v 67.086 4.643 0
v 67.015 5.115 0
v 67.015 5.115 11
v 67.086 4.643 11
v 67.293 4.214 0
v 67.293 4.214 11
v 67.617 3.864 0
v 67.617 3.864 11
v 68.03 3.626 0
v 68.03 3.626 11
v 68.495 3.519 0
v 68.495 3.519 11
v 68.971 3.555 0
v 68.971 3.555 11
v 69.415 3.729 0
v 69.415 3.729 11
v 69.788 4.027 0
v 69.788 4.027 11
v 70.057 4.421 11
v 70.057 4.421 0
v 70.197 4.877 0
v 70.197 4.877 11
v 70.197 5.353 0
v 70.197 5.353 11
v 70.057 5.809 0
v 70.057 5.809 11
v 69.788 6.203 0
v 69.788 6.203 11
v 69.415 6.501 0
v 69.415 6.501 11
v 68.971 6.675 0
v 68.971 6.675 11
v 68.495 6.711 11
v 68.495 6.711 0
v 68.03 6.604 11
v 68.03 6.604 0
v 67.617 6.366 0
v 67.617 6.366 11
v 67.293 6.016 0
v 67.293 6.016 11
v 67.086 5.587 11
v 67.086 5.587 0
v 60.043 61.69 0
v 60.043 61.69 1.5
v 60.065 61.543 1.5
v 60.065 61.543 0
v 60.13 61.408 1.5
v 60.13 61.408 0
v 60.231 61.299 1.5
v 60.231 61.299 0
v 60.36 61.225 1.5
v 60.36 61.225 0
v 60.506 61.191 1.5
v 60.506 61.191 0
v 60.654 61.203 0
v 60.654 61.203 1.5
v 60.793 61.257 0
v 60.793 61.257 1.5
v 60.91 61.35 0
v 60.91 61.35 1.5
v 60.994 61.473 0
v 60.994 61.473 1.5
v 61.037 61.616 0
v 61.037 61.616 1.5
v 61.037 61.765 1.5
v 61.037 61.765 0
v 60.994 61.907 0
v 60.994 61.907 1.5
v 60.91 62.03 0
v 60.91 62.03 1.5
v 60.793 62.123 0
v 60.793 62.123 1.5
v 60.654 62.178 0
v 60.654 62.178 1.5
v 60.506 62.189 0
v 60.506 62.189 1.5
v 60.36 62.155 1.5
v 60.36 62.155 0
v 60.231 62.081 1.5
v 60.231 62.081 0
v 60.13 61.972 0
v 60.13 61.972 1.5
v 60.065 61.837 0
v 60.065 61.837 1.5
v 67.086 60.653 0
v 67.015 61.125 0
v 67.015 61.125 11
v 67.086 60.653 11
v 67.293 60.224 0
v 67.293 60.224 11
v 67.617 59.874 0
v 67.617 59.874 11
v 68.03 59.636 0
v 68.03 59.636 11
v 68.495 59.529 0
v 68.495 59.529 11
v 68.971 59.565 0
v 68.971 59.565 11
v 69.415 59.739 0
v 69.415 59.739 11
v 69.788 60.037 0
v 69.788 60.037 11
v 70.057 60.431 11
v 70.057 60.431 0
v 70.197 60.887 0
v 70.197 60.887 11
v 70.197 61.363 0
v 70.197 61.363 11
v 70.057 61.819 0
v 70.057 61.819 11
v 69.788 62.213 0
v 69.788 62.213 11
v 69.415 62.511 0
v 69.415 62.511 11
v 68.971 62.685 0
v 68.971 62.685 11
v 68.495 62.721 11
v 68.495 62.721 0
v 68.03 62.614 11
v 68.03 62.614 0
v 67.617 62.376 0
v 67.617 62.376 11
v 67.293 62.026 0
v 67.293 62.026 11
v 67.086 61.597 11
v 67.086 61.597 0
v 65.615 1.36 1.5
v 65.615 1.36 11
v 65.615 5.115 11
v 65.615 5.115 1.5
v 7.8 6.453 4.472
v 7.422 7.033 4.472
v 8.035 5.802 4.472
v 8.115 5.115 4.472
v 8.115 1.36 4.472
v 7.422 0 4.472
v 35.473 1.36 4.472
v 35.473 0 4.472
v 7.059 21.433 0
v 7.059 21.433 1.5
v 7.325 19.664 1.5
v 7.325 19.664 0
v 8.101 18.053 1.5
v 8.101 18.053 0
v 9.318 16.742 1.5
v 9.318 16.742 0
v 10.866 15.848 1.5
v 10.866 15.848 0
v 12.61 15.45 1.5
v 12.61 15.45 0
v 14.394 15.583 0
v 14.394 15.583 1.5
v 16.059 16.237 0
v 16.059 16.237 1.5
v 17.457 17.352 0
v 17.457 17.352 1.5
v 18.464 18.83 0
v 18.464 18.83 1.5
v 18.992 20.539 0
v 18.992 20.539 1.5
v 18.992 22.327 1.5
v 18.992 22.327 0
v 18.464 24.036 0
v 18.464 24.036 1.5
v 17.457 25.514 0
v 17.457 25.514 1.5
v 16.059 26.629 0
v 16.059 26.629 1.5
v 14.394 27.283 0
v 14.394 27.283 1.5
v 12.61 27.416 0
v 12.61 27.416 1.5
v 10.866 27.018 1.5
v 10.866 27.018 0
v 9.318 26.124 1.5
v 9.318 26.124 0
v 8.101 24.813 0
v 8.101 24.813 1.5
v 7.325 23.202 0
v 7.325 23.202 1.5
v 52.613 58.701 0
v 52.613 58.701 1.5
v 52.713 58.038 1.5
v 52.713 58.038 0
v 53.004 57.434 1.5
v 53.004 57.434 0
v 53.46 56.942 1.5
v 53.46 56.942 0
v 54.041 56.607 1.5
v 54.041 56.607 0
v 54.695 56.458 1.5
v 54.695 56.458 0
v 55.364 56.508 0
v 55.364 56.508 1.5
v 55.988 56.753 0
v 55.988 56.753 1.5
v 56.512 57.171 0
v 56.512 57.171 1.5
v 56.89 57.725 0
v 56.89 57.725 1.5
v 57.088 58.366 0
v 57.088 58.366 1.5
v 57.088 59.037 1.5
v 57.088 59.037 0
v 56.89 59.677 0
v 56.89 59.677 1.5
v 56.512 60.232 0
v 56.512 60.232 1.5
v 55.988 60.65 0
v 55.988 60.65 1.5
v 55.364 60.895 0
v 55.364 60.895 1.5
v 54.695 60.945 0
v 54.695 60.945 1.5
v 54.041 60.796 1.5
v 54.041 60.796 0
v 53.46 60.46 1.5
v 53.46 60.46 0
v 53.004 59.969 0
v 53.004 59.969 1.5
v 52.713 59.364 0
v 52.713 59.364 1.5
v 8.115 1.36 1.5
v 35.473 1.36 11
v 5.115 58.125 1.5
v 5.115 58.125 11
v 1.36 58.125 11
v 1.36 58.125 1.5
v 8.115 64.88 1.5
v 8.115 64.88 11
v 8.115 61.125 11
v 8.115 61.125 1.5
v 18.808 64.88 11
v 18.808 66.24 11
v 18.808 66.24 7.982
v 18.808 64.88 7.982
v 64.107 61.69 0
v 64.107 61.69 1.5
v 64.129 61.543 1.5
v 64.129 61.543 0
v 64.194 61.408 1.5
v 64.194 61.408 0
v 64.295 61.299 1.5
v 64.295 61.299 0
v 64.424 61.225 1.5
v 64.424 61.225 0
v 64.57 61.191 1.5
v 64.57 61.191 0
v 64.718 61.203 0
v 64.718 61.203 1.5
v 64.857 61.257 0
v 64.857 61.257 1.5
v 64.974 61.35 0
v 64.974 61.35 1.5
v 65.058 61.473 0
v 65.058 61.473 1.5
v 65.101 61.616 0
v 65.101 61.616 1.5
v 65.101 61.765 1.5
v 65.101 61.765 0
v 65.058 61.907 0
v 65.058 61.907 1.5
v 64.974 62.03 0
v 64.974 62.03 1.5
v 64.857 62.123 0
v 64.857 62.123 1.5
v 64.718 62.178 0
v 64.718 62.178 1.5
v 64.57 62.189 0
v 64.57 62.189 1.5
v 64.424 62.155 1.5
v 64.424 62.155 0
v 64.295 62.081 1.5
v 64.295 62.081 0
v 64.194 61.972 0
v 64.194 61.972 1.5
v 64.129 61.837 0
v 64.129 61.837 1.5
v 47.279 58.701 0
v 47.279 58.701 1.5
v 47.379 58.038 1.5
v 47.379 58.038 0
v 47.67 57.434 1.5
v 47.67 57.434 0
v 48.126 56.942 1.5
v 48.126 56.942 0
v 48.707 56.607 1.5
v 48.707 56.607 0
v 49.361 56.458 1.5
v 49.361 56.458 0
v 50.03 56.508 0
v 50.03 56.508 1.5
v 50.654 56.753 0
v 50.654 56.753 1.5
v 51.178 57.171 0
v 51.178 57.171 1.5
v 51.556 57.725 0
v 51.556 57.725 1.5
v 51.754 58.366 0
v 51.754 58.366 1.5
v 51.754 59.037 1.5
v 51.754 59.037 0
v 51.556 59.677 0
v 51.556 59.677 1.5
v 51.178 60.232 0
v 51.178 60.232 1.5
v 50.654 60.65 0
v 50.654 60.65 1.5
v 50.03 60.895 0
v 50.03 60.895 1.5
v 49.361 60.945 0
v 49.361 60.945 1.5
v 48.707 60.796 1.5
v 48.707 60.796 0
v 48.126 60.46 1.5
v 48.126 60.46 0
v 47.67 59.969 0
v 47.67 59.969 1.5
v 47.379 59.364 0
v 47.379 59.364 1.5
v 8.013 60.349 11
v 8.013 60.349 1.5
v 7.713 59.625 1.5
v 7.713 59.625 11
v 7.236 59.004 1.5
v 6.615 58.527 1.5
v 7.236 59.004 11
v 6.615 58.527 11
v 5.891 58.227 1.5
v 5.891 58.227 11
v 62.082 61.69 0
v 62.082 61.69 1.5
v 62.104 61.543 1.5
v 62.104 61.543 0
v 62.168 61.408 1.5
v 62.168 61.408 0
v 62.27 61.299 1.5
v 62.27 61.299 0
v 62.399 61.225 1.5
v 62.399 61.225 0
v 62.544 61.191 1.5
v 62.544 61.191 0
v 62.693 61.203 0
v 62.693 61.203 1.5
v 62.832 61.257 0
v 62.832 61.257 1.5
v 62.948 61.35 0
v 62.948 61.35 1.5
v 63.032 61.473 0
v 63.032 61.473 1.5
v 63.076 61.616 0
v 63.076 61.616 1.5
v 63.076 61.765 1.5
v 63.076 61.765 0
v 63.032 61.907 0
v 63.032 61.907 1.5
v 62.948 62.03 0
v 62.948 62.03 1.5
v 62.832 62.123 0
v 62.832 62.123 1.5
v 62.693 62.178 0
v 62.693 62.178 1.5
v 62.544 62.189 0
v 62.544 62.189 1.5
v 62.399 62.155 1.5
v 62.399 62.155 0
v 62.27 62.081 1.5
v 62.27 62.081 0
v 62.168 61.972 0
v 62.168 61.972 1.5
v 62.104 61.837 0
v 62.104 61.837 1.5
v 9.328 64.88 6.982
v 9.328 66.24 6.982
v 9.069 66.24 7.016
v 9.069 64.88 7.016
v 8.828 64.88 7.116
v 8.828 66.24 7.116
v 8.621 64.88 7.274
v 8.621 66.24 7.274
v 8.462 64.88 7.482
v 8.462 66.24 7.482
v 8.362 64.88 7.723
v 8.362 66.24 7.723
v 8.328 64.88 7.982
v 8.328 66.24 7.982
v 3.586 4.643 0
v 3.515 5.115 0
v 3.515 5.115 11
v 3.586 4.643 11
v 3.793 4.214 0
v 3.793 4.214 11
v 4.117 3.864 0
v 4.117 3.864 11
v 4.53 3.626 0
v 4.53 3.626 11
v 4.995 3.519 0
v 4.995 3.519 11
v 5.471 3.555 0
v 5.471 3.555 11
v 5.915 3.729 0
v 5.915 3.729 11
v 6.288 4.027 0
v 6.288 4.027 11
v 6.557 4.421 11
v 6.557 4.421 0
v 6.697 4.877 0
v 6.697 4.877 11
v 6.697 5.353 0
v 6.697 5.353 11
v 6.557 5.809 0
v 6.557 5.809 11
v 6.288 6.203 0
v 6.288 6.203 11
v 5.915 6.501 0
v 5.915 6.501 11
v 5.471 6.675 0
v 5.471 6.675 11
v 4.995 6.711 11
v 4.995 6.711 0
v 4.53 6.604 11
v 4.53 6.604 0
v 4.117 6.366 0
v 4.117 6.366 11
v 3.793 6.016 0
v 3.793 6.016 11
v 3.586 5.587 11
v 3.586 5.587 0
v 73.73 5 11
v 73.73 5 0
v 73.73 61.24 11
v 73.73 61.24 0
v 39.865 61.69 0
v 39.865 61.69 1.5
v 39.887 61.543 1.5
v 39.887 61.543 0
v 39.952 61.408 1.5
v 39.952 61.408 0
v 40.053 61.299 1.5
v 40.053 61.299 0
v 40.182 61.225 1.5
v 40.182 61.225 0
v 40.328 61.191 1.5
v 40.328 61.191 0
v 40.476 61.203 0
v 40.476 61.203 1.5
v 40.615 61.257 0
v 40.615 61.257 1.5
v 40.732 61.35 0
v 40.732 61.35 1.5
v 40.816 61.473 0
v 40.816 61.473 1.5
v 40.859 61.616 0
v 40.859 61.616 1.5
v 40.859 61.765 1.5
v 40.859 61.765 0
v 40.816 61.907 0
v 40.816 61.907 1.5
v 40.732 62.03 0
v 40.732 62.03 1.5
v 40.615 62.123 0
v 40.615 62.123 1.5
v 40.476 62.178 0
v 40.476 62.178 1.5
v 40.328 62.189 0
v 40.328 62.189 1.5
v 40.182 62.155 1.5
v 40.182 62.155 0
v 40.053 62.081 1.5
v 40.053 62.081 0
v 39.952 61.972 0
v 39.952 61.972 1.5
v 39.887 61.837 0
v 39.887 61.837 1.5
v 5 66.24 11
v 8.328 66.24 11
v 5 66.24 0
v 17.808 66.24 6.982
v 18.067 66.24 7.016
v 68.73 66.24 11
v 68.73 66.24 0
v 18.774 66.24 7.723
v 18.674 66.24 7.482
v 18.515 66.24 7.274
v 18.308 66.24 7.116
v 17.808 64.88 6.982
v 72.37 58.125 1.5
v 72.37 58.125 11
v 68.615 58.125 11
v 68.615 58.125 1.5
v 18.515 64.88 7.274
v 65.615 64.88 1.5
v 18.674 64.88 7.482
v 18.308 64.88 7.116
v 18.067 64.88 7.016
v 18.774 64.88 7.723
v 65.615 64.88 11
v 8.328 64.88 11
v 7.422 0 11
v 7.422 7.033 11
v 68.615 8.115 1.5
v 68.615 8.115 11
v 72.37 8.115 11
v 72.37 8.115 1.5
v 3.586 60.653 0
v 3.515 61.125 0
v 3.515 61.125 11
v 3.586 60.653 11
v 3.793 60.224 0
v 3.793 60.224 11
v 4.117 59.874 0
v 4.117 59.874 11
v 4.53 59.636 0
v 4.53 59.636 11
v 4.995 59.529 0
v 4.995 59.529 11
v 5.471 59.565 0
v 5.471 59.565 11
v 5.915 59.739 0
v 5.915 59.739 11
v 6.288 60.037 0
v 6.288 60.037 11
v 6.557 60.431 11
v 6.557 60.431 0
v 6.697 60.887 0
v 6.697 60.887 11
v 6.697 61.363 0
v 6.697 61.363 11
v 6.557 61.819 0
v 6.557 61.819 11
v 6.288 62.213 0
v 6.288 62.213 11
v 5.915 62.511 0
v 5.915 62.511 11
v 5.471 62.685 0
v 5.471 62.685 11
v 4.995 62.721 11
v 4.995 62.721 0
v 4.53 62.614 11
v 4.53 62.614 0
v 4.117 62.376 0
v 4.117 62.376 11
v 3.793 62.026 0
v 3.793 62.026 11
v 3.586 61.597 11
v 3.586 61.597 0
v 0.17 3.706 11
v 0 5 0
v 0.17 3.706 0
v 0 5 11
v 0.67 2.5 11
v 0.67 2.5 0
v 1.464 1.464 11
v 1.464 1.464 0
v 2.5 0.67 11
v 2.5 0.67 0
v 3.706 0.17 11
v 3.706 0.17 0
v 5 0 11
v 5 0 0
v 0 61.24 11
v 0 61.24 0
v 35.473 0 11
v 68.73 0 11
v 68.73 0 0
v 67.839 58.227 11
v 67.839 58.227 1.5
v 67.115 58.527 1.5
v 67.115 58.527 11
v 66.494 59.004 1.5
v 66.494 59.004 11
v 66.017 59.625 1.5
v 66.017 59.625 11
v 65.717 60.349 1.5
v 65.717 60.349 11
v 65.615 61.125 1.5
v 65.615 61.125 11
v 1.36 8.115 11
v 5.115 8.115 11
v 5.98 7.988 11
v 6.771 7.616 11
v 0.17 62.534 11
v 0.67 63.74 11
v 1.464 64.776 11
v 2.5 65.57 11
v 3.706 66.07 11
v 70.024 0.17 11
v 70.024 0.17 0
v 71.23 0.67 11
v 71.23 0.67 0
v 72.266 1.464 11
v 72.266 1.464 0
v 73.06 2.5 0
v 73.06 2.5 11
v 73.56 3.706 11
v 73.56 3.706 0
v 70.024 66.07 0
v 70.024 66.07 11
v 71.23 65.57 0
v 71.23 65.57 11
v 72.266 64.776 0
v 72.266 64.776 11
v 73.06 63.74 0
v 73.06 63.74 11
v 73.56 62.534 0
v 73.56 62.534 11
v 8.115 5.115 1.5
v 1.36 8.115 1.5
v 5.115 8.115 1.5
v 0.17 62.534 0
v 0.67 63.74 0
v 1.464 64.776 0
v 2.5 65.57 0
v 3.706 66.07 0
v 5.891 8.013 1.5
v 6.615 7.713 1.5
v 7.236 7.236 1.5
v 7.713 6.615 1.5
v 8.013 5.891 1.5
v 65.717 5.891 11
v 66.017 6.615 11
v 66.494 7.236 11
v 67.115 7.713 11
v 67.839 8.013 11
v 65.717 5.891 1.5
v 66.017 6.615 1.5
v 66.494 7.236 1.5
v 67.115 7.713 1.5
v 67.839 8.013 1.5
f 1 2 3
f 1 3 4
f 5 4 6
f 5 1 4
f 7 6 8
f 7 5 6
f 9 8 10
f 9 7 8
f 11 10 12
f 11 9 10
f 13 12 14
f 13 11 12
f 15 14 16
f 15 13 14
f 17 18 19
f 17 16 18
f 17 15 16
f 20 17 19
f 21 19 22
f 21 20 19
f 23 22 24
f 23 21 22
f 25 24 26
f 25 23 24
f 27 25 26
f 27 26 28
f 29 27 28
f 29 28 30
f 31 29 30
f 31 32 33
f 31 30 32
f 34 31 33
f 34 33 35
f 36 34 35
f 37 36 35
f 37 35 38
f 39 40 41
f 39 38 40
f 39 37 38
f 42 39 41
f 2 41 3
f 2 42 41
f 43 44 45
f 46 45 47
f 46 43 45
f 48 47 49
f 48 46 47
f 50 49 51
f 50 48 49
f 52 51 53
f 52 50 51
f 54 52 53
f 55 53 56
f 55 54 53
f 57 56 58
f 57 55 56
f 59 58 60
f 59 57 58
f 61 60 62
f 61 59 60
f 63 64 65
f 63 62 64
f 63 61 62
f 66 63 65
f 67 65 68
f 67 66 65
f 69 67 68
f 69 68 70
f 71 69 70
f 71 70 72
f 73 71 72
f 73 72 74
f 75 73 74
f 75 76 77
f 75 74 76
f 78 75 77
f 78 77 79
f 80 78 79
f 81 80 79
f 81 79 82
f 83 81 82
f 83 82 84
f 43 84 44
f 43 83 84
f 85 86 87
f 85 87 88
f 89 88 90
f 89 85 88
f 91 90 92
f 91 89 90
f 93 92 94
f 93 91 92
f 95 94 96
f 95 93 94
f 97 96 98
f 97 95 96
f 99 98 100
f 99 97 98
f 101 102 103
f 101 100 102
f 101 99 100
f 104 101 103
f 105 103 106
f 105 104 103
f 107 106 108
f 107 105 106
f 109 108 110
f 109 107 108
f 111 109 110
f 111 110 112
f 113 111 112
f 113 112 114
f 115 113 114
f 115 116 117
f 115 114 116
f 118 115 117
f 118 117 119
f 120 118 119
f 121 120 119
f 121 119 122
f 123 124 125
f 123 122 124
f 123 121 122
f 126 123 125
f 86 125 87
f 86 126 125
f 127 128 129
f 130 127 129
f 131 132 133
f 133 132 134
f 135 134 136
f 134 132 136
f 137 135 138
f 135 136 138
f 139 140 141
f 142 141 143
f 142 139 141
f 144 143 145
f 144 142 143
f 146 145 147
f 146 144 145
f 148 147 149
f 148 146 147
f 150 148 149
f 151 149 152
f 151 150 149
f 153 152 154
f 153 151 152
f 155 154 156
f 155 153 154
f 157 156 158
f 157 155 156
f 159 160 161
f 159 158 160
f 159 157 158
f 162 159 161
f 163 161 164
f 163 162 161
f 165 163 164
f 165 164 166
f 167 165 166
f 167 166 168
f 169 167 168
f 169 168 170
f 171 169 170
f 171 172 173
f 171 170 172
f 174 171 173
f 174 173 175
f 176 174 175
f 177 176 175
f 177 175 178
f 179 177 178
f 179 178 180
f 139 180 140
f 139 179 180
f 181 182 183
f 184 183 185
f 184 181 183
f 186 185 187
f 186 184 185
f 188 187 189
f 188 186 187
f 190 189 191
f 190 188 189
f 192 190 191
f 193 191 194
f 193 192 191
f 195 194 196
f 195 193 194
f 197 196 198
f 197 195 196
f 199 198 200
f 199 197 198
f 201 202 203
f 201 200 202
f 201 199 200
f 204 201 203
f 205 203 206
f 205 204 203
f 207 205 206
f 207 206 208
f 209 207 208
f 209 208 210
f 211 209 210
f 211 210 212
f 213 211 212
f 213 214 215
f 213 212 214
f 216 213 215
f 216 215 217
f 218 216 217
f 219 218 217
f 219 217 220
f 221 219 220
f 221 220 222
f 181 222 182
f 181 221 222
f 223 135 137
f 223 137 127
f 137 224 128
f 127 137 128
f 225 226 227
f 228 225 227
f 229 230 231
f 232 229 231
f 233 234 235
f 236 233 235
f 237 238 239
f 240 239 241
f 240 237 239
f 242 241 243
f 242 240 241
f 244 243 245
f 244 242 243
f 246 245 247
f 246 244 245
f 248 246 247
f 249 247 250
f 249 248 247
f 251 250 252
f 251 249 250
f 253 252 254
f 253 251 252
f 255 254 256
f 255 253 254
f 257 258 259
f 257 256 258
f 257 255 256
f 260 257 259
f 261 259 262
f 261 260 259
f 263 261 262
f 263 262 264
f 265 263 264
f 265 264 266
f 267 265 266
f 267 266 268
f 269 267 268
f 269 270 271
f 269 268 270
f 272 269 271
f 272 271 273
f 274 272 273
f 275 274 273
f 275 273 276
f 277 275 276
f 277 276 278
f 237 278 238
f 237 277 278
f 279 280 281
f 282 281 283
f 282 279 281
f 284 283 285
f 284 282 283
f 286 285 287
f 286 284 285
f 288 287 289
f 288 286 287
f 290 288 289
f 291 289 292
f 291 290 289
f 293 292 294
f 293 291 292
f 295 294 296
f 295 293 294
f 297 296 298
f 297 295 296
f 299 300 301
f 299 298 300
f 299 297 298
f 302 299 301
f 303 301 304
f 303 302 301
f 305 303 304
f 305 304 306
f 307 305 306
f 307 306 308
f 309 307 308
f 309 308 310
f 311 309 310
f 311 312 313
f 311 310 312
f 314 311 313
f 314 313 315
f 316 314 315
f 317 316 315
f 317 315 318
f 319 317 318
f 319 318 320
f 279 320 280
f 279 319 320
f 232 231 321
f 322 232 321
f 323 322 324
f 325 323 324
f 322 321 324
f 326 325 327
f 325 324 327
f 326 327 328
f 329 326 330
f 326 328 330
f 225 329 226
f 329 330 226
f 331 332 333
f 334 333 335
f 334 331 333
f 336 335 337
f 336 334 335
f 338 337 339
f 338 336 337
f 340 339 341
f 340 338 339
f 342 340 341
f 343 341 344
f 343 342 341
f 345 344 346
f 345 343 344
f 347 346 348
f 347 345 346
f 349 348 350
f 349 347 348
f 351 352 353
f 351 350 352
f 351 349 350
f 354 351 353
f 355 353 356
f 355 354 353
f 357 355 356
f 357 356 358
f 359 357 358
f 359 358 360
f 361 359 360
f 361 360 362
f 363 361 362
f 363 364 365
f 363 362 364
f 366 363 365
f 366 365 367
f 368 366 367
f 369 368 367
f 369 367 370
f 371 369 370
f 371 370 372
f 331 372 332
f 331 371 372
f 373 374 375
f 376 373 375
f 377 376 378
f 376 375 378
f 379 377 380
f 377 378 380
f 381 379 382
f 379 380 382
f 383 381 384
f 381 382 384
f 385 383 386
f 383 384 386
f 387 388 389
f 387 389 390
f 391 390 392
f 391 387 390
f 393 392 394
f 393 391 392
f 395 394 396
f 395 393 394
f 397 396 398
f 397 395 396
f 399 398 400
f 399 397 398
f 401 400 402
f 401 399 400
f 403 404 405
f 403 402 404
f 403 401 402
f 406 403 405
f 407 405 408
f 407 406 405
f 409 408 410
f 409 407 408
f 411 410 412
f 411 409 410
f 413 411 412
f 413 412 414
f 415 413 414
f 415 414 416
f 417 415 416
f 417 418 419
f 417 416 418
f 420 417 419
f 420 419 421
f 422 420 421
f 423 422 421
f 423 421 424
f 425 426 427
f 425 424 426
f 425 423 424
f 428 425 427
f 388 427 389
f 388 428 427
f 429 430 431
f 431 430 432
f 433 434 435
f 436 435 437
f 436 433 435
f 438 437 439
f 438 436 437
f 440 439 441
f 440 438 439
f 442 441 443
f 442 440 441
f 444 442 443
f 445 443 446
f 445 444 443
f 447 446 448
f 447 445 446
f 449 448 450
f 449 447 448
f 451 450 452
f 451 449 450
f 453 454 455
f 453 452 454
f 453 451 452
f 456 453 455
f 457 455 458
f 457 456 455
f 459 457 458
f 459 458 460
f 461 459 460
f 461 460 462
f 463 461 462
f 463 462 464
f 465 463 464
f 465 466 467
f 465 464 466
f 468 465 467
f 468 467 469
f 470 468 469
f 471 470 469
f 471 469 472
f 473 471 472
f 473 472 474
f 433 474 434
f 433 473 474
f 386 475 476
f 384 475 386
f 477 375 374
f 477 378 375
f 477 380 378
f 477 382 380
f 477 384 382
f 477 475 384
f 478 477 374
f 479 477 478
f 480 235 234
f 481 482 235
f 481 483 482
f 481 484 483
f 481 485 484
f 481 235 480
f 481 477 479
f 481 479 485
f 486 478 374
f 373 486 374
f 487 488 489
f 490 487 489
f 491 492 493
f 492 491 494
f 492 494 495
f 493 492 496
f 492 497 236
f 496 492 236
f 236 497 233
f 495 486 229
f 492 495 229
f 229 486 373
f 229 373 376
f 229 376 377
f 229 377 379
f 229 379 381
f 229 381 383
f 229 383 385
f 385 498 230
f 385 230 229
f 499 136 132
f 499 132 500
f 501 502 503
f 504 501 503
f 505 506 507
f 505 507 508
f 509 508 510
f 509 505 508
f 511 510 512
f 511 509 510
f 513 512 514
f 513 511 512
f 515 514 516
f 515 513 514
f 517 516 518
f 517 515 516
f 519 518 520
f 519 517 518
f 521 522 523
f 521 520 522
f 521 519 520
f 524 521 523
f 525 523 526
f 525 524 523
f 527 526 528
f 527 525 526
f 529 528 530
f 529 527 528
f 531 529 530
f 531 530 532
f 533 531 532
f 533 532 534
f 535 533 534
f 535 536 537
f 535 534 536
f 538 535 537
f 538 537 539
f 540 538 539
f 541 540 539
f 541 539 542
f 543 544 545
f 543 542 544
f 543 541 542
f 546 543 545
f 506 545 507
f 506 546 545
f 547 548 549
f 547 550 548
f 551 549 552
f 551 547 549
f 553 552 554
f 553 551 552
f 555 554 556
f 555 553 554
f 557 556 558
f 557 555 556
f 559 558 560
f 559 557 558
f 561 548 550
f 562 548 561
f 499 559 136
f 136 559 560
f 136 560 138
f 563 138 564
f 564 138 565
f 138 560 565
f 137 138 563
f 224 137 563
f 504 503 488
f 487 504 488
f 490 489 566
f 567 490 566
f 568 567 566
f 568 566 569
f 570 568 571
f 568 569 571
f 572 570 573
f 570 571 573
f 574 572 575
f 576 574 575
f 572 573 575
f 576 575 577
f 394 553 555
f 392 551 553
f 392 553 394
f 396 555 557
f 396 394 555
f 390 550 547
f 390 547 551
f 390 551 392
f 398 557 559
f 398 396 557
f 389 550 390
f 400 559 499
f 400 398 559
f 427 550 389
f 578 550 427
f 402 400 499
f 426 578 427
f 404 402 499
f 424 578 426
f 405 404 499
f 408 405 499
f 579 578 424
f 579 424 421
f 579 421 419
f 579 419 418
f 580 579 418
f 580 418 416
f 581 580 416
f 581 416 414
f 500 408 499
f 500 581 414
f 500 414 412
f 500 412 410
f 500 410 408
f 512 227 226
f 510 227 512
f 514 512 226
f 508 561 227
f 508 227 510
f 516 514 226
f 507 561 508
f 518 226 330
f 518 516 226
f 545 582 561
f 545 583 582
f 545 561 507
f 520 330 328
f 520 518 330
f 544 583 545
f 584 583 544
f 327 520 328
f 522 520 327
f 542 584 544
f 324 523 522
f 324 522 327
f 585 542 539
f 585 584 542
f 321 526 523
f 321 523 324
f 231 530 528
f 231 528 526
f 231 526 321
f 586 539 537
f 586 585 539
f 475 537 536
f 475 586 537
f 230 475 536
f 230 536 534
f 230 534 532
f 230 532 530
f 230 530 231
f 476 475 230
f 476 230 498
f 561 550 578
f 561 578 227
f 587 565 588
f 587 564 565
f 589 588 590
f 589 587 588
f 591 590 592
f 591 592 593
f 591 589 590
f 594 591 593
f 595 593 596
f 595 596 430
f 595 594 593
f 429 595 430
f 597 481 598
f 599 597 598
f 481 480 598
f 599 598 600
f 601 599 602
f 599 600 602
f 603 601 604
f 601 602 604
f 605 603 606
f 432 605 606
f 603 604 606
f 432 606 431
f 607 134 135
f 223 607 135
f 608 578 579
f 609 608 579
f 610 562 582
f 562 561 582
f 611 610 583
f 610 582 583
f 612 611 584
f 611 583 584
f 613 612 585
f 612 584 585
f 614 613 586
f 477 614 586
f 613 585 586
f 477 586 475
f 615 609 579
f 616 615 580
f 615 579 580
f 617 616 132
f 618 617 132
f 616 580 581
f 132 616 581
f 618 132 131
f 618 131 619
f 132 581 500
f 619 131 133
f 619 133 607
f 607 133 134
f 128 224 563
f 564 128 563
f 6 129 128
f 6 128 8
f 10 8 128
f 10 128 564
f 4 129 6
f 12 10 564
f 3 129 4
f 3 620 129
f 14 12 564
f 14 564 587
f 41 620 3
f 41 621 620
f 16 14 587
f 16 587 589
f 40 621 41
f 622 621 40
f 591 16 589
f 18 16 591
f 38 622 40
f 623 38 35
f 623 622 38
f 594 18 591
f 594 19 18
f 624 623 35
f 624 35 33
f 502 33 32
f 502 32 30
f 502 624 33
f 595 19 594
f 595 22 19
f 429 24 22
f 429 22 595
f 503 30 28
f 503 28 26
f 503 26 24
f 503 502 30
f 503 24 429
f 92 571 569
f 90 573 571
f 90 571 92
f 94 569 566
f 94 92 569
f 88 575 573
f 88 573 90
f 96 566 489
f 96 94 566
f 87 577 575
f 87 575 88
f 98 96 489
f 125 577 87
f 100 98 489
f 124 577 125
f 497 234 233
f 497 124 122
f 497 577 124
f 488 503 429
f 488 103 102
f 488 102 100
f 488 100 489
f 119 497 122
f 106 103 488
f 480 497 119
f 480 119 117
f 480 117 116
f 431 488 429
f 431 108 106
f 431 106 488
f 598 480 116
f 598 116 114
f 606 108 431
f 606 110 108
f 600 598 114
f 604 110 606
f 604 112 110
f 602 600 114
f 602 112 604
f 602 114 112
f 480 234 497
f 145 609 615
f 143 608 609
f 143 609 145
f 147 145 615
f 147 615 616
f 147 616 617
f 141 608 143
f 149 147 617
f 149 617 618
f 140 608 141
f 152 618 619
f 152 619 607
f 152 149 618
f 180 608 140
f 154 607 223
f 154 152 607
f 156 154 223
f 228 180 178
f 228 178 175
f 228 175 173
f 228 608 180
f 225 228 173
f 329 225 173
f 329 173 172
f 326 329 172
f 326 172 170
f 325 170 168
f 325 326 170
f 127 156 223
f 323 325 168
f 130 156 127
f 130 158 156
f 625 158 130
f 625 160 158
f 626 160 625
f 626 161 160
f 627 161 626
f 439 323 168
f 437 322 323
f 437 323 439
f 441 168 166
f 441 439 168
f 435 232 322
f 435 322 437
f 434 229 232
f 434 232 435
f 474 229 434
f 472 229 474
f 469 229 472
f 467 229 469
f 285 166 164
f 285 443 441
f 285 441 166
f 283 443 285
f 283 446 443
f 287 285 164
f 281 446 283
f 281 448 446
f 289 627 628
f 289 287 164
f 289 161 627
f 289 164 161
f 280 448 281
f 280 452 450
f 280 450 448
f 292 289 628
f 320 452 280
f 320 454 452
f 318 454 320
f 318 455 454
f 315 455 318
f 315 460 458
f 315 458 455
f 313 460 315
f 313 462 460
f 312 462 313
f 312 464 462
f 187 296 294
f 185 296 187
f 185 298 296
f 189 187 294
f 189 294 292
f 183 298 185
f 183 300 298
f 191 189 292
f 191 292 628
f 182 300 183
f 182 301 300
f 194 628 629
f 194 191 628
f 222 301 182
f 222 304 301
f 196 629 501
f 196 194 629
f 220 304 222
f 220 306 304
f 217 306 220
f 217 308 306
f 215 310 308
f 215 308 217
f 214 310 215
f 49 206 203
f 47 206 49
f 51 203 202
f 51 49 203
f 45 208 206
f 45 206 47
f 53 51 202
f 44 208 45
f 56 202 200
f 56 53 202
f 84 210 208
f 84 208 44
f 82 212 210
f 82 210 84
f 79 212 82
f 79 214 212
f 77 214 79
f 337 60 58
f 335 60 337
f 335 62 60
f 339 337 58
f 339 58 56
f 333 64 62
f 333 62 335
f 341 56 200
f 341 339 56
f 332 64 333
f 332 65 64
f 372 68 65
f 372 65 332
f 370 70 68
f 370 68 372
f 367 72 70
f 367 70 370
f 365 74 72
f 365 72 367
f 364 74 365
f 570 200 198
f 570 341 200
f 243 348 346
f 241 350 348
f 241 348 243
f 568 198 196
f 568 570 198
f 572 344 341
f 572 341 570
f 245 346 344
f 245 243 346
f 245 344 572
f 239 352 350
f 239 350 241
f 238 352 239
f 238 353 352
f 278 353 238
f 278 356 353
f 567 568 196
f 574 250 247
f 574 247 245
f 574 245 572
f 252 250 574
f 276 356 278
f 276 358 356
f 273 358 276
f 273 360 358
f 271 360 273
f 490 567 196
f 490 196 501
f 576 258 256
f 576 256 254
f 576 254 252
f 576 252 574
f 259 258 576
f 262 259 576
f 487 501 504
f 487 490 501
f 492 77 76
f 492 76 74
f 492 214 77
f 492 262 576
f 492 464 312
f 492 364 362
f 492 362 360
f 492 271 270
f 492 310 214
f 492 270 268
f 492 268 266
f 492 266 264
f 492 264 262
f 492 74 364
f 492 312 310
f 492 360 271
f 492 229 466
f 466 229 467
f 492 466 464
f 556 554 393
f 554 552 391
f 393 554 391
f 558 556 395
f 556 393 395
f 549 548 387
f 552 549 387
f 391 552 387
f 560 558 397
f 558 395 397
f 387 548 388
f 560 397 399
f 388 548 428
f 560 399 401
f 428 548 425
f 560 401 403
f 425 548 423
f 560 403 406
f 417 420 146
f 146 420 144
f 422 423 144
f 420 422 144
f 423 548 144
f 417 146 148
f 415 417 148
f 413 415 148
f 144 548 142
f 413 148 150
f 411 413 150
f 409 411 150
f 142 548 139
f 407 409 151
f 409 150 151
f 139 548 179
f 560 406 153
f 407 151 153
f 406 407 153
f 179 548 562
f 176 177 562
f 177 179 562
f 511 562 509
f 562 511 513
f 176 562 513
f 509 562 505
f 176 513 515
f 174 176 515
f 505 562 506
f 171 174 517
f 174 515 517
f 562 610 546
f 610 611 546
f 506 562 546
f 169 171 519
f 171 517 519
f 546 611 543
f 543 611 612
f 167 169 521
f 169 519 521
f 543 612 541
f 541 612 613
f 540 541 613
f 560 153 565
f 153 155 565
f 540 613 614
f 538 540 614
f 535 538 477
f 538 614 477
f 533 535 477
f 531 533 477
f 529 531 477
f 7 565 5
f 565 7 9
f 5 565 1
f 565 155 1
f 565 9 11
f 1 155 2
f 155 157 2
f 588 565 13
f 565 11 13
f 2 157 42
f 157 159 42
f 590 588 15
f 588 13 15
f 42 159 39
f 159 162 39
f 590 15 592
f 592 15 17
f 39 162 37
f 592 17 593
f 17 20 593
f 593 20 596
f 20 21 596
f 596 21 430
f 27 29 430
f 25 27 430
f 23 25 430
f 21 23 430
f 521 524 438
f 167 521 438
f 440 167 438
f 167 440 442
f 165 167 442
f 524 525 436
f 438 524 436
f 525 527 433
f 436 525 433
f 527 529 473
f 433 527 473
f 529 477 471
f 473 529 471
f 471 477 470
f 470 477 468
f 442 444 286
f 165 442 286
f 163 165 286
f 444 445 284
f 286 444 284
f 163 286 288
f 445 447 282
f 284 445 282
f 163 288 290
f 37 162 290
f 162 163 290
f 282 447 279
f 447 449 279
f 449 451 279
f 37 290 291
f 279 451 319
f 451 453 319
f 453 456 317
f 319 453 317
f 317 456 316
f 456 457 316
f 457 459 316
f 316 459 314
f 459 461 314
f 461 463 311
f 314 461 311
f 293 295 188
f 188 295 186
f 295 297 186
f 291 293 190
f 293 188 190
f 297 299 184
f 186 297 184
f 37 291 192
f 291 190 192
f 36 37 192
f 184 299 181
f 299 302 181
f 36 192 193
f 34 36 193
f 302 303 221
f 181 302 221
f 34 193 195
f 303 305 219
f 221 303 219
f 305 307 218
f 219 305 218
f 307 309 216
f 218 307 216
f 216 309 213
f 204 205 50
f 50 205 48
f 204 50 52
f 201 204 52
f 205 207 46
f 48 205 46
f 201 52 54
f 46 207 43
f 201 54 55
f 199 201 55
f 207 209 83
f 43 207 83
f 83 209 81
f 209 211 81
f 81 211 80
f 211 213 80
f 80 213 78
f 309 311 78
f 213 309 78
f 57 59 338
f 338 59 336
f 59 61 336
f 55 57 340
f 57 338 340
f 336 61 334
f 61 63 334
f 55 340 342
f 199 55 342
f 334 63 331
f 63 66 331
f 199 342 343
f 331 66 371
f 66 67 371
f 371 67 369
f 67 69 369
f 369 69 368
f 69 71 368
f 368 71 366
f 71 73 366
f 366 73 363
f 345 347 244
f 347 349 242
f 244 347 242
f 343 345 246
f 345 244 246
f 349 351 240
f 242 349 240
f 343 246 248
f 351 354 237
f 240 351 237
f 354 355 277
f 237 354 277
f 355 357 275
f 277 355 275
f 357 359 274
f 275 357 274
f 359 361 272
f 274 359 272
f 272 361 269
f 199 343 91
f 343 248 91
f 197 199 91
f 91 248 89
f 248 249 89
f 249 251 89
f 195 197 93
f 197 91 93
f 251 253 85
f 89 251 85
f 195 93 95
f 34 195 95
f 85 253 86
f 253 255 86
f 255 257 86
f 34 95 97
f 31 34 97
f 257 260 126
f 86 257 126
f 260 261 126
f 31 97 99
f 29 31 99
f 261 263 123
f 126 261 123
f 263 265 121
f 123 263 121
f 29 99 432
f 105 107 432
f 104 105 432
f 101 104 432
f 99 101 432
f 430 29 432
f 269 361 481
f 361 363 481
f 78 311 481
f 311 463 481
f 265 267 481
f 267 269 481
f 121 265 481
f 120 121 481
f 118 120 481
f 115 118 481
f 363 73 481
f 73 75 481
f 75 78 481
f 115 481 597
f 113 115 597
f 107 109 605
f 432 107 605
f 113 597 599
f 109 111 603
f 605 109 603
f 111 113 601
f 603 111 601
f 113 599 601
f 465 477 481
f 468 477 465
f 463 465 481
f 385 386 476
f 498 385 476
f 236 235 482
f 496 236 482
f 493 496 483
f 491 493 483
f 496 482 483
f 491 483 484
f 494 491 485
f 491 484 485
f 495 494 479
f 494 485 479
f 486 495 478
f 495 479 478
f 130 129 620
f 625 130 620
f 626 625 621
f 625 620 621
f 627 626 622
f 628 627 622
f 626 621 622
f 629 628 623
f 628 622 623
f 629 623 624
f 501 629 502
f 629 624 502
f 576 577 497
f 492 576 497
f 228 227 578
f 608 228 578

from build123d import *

# Parameters (mm, degrees)
SKETCH_1_W               = 73.73
SKETCH_1_H               = 66.24
EXTRUDE_1_DEPTH          = 11
CUT_EXTRUDE_1_DEPTH      = 14
CUT_EXTRUDE_1_DEPTH_BACK = 100.723871265
SKETCH_5_R               = 1.6
CUT_EXTRUDE_2_DEPTH      = 9.5
SKETCH_8_R               = 0.5
SKETCH_8_R_2             = 0.499999992
SKETCH_8_R_3             = 2.25
SKETCH_8_R_4             = 6
CUT_EXTRUDE_3_DEPTH      = 9
CUT_EXTRUDE_4_DEPTH      = 9
SKETCH_11_W              = 28.050882838
SKETCH_11_H              = 6.729999604
CUT_EXTRUDE_5_DEPTH      = 9
FILLET_1_R               = 5


with BuildPart() as part:
    # 草图1 → 凸台-拉伸1 (new body)
    with BuildSketch(Plane.XY):
        with Locations((36.865, 33.12)):
            Rectangle(SKETCH_1_W, SKETCH_1_H)
    extrude(amount=EXTRUDE_1_DEPTH)

    # 草图5 → 切除-拉伸1 (cut, two sides: drawn at the far end of the back side and taken through both)
    with BuildSketch(Plane.XY.offset(-CUT_EXTRUDE_1_DEPTH_BACK)):
        with Locations(Location((5.115, 61.125, 0), (0, 0, 180))):
            Circle(SKETCH_5_R)
        with Locations(Location((68.615, 61.125, 0), (0, 0, 180))):
            Circle(SKETCH_5_R)
        with Locations(Location((68.615, 5.115, 0), (0, 0, 180))):
            Circle(SKETCH_5_R)
        with Locations(Location((5.115, 5.115, 0), (0, 0, 180))):
            Circle(SKETCH_5_R)
    extrude(amount=CUT_EXTRUDE_1_DEPTH + CUT_EXTRUDE_1_DEPTH_BACK, mode=Mode.SUBTRACT)

    # 草图6 → 切除-拉伸2 (cut)
    with BuildSketch(Plane.XY.offset(11)):
        with BuildLine():
            Line((1.36, 58.125), (1.36, 8.115))
            Line((1.36, 8.115), (5.115, 8.115))
            ThreePointArc((5.115, 8.115), (7.236320344, 7.236320344), (8.115, 5.115))
            Line((8.115, 5.115), (8.115, 1.36))
            Line((8.115, 1.36), (65.615, 1.36))
            Line((65.615, 1.36), (65.615, 5.115))
            ThreePointArc((65.615, 5.115), (66.493679656, 7.236320344), (68.615, 8.115))
            Line((68.615, 8.115), (72.37, 8.115))
            Line((72.37, 8.115), (72.37, 58.125))
            Line((72.37, 58.125), (68.615, 58.125))
            ThreePointArc((68.615, 58.125), (66.493679656, 59.003679656), (65.615, 61.125))
            Line((65.615, 61.125), (65.615, 64.88))
            Line((65.615, 64.88), (8.115, 64.88))
            Line((8.115, 64.88), (8.115, 61.125))
            ThreePointArc((8.115, 61.125), (7.236320344, 59.003679656), (5.115, 58.125))
            Line((5.115, 58.125), (1.36, 58.125))
        make_face()
    extrude(amount=-CUT_EXTRUDE_2_DEPTH, mode=Mode.SUBTRACT)

    # 草图8 → 切除-拉伸3 (cut)
    with BuildSketch(Plane.XY):
        with Locations(Location((62.581524864, 61.690056586, 0), (0, 0, 180))):
            Circle(SKETCH_8_R)
        with Locations(Location((60.543023731, 61.690056586, 0), (0, 0, 180))):
            Circle(SKETCH_8_R_2)
        with Locations(Location((64.607021964, 61.690056586, 0), (0, 0, 180))):
            Circle(SKETCH_8_R)
        with Locations(Location((54.862855038, 58.701240743, 0), (0, 0, 180))):
            Circle(SKETCH_8_R_3)
        with Locations(Location((49.528855397, 58.701240743, 0), (0, 0, 180))):
            Circle(SKETCH_8_R_3)
        with Locations(Location((40.365063963, 61.690056586, 0), (0, 0, 180))):
            Circle(SKETCH_8_R)
        with Locations(Location((13.058538298, 21.432969982, 0), (0, 0, 180))):
            Circle(SKETCH_8_R_4)
    extrude(amount=CUT_EXTRUDE_3_DEPTH, mode=Mode.SUBTRACT)

    # 草图10 → 切除-拉伸4 (cut)
    with BuildSketch(Plane(origin=(0, 66.24, 0), x_dir=(1, 0, 0), z_dir=(0, 1, 0))):
        with BuildLine():
            Line((17.808167787, -6.98156116), (9.328167793, -6.98156116))
            ThreePointArc((9.328167793, -6.98156116), (8.621061012, -7.274454379), (8.328167793, -7.98156116))
            Line((8.328167793, -7.98156116), (8.328167793, -11))
            Line((8.328167793, -11), (18.808167787, -11))
            Line((18.808167787, -11), (18.808167787, -7.98156116))
            ThreePointArc((18.808167787, -7.98156116), (18.515274569, -7.274454379), (17.808167787, -6.98156116))
        make_face()
    extrude(amount=-CUT_EXTRUDE_4_DEPTH, mode=Mode.SUBTRACT)

    # 草图11 → 切除-拉伸5 (cut)
    with BuildSketch(Plane.XZ):
        with Locations((21.447326516, 7.836561358)):
            Rectangle(SKETCH_11_W, SKETCH_11_H)
    extrude(amount=-CUT_EXTRUDE_5_DEPTH, mode=Mode.SUBTRACT)

    # 圆角1
    fillet_1_edges = [part.edges().sort_by_distance(p)[0] for p in [
        (0, 66.24, 5.5),
        (73.73, 66.24, 5.5),
        (73.73, 0, 5.5),
        (0, 0, 5.5),
    ]]
    fillet(fillet_1_edges, radius=FILLET_1_R)


solid = part.part
